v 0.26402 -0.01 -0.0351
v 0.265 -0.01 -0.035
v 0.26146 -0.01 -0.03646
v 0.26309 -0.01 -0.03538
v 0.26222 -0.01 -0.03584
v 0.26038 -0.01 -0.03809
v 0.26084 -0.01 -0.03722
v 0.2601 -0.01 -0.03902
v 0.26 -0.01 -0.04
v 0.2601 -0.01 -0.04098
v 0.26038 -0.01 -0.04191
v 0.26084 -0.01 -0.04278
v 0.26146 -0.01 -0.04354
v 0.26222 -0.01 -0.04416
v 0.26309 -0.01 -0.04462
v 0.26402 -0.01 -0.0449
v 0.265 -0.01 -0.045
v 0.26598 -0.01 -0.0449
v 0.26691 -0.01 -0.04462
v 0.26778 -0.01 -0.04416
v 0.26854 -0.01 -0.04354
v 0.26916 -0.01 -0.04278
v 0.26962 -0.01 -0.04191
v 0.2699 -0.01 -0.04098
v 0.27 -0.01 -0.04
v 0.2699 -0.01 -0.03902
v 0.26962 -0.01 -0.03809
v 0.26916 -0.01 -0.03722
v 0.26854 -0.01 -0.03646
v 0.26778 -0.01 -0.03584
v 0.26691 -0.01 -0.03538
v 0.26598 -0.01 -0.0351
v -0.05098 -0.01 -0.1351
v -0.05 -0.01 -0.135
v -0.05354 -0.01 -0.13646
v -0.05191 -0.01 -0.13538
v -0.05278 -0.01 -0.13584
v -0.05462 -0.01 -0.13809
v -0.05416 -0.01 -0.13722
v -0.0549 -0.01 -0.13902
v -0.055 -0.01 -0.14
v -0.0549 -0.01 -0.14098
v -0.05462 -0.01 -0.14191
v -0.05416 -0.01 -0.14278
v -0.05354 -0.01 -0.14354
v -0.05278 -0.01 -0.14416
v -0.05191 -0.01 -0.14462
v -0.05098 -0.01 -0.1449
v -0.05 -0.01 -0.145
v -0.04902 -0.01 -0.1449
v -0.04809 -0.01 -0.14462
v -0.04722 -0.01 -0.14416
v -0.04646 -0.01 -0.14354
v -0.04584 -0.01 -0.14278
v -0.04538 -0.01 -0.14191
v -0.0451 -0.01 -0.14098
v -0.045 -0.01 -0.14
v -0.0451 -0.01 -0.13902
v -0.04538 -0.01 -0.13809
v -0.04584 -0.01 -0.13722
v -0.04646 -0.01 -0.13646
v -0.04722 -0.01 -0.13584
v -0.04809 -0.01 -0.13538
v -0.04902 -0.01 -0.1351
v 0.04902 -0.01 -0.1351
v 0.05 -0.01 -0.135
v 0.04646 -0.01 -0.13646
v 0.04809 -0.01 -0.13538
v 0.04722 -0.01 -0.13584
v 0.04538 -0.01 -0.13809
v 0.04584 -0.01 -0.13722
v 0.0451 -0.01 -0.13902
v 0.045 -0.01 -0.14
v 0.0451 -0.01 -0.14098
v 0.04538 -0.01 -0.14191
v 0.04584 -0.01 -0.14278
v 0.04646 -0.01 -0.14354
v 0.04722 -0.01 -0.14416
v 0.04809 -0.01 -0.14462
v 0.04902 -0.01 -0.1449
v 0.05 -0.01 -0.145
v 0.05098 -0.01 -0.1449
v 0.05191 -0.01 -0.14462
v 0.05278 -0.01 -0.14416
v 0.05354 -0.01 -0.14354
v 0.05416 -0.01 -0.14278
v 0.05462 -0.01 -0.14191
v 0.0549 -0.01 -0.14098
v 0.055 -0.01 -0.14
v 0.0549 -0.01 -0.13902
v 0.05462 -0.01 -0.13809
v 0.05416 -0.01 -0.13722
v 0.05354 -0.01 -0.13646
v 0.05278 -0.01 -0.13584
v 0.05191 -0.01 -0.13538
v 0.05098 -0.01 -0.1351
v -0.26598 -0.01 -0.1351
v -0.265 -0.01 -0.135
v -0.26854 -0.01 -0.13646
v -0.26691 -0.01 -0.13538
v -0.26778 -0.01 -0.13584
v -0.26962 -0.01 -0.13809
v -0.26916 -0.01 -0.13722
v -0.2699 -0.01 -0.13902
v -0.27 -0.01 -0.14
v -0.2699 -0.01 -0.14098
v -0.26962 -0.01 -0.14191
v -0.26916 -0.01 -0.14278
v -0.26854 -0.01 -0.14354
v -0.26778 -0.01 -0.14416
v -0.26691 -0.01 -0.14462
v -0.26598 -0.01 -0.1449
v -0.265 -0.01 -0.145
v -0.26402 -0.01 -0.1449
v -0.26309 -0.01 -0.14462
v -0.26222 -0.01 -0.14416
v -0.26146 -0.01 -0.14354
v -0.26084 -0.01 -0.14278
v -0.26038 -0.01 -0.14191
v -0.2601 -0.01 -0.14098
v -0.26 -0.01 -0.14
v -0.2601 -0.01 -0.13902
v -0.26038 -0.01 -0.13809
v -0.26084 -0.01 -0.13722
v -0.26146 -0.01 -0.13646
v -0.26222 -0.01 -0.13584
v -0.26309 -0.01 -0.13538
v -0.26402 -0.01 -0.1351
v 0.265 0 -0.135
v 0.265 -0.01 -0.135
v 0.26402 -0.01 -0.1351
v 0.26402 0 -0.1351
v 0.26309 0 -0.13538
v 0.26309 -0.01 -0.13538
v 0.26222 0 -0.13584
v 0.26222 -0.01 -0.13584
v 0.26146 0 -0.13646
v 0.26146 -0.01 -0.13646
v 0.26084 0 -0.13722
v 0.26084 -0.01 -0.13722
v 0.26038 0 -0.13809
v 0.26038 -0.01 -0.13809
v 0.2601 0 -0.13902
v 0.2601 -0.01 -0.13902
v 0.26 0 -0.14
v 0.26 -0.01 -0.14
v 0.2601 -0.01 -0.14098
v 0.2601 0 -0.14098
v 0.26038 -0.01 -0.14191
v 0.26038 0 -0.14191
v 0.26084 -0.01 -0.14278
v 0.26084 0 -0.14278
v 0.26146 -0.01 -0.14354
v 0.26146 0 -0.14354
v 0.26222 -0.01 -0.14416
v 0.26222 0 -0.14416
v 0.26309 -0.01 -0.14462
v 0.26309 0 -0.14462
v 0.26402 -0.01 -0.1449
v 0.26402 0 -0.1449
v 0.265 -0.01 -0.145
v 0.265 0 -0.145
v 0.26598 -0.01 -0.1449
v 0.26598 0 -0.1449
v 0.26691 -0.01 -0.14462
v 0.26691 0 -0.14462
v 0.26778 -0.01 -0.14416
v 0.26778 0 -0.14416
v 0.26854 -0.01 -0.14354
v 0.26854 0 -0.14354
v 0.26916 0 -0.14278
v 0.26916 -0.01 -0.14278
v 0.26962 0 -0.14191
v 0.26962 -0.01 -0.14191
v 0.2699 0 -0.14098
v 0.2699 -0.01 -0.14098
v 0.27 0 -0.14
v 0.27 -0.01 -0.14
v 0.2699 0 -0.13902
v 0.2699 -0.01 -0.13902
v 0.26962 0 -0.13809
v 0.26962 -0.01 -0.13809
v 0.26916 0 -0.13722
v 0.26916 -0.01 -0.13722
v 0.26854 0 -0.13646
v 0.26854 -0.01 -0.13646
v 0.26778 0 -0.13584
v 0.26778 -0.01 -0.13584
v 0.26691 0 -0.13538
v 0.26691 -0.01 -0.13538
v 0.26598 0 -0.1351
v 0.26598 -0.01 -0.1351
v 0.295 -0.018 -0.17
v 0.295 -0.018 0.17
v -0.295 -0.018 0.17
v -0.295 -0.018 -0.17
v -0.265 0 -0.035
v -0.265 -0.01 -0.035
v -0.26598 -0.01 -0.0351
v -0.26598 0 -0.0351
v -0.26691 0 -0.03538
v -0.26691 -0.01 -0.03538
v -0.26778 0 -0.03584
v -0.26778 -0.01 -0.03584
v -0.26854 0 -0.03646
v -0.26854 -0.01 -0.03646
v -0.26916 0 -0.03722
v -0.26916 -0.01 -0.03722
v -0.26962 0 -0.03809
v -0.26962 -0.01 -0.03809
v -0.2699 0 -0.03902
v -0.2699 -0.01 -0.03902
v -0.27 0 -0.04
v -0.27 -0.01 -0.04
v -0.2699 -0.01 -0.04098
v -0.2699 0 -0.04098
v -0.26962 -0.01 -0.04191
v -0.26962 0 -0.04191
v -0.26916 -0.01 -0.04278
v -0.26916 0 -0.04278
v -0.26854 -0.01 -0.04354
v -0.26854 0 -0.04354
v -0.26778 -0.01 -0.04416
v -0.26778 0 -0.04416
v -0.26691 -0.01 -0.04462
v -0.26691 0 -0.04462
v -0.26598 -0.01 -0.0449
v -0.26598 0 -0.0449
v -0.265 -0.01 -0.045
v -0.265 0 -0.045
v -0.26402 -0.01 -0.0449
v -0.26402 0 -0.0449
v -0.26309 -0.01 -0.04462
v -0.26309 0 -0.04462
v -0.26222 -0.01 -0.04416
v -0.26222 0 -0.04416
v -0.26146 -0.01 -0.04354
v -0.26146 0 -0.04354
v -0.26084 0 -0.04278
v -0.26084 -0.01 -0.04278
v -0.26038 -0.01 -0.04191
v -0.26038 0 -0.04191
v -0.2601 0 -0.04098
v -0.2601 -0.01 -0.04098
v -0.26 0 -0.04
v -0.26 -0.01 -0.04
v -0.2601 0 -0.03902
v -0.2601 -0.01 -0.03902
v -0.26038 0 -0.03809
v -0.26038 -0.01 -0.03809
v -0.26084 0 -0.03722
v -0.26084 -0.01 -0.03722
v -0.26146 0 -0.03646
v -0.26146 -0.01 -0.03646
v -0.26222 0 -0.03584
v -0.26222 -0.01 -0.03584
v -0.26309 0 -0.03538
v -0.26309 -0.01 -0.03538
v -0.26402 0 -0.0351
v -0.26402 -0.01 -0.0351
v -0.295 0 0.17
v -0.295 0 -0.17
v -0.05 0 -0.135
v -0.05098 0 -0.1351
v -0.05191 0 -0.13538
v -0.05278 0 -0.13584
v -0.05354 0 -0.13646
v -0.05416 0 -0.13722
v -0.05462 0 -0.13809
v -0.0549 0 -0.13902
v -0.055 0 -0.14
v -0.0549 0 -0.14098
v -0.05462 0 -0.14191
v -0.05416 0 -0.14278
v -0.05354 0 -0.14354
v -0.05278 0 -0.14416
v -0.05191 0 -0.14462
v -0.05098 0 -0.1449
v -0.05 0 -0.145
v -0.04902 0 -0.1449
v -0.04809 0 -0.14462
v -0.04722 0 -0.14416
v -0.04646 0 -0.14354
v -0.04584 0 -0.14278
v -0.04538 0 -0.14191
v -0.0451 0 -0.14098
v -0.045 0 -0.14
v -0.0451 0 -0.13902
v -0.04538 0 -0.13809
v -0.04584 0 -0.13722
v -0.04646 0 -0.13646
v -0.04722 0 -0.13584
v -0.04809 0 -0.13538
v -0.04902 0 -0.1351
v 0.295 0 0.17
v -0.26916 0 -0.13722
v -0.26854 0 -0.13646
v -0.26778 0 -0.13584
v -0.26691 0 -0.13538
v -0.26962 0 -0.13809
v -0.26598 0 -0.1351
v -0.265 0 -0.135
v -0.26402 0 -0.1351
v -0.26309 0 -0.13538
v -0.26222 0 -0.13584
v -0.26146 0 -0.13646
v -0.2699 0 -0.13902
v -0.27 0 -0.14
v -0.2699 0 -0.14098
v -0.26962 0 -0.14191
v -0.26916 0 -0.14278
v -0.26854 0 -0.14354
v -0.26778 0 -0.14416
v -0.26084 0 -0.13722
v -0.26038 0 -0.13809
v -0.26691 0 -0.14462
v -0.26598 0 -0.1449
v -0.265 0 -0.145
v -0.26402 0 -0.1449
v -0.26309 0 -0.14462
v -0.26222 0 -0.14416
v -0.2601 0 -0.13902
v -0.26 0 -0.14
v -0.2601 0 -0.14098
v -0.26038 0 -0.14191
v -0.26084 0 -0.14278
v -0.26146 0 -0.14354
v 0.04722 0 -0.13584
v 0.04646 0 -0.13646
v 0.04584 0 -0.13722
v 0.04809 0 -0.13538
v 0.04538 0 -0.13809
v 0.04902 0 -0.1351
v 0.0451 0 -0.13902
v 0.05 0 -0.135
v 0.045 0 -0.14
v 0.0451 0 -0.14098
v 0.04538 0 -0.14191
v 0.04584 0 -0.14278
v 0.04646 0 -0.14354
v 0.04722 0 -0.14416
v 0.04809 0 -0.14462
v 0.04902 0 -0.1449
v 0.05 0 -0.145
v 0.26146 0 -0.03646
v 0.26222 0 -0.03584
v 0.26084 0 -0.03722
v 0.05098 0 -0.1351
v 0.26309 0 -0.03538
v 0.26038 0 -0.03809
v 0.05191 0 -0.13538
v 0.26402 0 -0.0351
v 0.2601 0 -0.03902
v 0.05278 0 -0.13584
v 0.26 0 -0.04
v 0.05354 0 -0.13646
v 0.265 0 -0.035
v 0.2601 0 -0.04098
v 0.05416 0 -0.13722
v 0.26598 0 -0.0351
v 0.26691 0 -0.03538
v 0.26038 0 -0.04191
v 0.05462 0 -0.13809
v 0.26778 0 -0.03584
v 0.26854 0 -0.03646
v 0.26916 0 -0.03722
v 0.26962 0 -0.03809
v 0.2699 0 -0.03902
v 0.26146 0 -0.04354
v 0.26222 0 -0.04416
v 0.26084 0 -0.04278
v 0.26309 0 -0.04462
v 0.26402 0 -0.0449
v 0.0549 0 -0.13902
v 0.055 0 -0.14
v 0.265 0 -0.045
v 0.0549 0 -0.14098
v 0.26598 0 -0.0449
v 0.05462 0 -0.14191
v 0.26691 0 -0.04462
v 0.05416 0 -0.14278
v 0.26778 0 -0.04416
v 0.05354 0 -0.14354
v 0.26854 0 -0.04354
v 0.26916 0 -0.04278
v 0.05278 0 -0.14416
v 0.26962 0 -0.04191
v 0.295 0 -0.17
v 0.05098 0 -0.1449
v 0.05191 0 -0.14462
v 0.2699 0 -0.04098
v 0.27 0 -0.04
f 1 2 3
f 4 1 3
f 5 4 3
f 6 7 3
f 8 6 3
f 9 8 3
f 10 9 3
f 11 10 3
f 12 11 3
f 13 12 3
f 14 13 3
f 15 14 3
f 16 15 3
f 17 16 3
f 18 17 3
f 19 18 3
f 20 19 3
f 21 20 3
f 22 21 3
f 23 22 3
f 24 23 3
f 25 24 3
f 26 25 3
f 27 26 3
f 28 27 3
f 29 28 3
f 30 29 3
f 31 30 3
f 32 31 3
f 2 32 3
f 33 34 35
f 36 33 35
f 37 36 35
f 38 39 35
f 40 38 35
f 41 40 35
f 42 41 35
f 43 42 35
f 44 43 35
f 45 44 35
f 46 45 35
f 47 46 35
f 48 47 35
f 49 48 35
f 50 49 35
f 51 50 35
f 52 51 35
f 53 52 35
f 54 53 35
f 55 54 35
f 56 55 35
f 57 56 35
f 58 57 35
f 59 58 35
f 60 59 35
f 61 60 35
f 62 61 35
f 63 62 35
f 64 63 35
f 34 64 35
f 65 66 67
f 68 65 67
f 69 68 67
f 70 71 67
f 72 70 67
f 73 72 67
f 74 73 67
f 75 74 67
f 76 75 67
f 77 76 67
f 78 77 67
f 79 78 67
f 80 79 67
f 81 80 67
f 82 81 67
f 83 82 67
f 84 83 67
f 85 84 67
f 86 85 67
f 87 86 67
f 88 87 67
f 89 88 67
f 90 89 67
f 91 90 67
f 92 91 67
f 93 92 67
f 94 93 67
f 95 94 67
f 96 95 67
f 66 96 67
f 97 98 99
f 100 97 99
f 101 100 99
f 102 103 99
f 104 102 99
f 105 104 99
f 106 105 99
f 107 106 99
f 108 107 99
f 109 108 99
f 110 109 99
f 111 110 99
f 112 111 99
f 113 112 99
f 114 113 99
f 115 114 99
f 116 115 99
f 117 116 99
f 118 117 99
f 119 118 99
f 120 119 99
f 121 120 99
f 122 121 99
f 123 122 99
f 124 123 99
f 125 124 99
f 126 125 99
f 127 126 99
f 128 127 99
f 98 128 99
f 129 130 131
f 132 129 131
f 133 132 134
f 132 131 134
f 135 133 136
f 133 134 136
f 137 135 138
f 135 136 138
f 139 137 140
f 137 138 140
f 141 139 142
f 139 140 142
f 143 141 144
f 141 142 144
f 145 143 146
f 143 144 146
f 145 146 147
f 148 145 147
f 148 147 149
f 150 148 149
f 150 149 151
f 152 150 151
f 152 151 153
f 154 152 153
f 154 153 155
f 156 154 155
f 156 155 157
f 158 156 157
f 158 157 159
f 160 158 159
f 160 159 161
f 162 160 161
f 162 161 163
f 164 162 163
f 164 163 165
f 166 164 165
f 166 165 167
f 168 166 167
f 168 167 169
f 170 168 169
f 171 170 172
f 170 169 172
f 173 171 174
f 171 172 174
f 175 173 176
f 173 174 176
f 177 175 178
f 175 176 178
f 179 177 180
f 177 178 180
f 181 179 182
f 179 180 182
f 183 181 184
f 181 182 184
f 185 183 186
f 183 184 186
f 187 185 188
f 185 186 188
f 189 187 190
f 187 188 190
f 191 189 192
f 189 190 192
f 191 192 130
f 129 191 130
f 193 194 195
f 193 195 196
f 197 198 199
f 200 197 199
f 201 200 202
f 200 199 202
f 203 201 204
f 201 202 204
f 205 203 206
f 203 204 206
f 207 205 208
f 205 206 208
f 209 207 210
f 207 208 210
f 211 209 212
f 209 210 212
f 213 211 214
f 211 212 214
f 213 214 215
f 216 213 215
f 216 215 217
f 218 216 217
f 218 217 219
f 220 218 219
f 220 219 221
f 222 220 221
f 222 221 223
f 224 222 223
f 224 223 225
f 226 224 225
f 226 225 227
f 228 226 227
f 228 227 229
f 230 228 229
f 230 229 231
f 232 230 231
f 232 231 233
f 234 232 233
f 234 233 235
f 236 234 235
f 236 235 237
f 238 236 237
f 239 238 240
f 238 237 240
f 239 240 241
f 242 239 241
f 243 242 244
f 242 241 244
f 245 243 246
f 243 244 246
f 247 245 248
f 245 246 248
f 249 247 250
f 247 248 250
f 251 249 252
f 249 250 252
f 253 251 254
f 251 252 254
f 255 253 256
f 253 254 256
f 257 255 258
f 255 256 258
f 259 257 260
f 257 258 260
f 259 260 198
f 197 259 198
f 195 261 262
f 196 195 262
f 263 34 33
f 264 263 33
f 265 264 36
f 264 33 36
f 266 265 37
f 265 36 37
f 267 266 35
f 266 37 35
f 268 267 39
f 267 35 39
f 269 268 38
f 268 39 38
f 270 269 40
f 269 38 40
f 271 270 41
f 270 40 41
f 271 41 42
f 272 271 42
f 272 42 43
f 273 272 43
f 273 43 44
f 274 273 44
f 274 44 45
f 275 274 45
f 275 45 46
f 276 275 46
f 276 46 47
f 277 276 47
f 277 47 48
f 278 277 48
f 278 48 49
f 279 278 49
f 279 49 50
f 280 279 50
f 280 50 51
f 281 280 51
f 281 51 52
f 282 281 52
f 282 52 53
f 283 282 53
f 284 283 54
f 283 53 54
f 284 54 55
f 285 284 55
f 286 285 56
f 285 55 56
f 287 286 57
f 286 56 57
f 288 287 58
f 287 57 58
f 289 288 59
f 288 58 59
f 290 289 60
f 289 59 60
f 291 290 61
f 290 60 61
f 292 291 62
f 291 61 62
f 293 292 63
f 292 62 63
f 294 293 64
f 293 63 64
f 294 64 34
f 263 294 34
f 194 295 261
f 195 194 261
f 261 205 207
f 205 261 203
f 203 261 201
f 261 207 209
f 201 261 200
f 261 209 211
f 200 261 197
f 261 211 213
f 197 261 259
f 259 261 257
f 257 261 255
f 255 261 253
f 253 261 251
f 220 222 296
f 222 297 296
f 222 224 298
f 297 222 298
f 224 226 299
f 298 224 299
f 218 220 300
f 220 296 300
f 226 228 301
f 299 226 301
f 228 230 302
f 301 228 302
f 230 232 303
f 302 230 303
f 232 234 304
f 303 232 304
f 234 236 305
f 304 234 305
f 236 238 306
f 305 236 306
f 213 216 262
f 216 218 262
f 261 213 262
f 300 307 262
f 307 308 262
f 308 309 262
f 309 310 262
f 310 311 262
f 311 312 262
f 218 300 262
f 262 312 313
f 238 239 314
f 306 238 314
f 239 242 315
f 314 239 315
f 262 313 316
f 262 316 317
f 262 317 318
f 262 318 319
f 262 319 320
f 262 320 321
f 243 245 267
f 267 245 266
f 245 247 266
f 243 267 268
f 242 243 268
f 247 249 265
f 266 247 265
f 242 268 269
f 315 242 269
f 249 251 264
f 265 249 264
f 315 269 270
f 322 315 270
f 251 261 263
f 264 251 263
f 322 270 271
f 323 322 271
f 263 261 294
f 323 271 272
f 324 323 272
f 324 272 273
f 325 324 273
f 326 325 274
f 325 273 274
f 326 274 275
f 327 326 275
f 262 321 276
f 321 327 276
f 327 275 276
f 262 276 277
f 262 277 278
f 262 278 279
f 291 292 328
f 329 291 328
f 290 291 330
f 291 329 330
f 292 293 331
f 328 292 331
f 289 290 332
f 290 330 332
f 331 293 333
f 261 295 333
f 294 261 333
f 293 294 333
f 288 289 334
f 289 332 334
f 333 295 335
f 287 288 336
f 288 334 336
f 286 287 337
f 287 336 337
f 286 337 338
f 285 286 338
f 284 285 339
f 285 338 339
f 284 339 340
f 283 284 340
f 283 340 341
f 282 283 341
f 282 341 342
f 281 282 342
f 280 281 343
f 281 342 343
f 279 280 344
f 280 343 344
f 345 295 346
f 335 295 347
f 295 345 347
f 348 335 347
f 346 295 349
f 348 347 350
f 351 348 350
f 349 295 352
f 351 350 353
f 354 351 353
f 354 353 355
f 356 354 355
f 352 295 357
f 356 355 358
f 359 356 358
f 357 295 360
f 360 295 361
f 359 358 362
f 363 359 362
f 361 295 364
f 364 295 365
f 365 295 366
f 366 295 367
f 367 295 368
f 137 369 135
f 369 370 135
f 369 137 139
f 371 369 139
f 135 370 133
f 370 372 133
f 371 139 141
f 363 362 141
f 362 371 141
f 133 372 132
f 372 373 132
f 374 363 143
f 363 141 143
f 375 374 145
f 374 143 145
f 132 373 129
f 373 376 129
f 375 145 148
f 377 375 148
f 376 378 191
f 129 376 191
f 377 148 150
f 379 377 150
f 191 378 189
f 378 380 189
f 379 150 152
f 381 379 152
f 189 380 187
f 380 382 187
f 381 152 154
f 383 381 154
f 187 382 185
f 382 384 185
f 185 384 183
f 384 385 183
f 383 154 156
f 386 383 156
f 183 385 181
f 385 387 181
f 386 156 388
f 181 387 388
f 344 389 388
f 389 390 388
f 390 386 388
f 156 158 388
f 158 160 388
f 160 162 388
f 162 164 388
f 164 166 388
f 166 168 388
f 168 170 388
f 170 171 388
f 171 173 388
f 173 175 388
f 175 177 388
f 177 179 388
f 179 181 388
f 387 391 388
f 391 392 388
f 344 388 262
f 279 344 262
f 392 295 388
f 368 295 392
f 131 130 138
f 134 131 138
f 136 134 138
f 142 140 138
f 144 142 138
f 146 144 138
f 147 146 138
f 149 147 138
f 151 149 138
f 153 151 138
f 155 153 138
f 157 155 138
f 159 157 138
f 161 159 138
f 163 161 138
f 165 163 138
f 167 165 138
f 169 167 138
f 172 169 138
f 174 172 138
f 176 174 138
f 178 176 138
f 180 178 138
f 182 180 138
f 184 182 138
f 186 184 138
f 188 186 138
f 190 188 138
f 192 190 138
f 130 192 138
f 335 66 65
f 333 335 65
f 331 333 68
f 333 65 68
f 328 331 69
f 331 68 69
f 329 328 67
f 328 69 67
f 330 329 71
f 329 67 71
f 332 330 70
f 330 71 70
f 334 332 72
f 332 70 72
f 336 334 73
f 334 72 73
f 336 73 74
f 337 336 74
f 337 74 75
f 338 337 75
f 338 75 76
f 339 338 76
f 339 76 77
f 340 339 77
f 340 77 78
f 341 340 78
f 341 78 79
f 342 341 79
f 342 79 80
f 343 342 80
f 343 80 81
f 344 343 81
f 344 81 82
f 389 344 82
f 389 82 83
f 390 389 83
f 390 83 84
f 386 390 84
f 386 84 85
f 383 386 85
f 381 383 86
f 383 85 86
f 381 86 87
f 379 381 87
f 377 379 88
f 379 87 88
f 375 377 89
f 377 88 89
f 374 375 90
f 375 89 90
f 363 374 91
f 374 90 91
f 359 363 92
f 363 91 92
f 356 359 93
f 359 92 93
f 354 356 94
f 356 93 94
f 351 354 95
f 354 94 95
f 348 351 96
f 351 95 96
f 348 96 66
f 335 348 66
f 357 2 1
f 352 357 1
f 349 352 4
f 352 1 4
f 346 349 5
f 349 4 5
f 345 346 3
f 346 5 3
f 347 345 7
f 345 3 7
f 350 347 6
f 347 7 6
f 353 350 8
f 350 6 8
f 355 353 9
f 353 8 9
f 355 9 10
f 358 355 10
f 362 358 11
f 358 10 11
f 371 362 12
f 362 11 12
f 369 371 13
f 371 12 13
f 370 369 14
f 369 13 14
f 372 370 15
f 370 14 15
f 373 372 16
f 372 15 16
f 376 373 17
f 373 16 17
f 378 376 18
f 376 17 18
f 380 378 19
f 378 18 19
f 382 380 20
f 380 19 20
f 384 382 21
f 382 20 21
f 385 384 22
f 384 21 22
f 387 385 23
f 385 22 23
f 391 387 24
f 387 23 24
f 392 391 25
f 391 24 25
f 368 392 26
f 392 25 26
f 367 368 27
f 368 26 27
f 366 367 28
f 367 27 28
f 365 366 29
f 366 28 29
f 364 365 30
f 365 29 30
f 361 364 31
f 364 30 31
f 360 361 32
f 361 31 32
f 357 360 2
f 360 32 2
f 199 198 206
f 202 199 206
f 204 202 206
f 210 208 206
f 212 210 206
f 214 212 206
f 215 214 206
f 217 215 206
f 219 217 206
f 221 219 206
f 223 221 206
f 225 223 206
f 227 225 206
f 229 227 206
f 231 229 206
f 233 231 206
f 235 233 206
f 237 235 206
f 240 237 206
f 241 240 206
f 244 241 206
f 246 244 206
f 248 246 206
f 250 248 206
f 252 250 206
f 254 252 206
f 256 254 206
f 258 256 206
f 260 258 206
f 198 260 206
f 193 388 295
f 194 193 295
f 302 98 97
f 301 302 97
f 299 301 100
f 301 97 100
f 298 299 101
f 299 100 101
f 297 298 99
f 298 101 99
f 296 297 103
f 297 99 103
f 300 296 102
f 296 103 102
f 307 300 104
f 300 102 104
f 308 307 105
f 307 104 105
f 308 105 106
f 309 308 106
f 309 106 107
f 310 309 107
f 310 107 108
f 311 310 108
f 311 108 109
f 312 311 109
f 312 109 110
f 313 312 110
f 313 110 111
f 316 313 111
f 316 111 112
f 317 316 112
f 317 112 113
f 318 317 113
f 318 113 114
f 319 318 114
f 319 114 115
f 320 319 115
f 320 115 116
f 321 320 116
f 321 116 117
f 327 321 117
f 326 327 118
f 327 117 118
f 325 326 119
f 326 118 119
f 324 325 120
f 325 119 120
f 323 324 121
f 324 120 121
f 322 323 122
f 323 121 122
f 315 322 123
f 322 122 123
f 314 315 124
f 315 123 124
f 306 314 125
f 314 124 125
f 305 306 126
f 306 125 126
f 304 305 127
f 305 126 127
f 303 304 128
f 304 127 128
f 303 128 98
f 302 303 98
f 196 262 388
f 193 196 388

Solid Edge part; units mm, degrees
sketch "Sketch1" plane through (0, 0, 0) normal (0, -1, 0) x (1, 0, 0)
  line L0 (-0.295, -0.17) -> (0.295, -0.17)
  line L1 (0.295, -0.17) -> (0.295, 0.17)
  line L2 (0.295, 0.17) -> (-0.295, 0.17)
  line L3 (-0.295, 0.17) -> (-0.295, -0.17)
  dimension "D1" = 0.34
  dimension "D2" = 0.59
extrude "Protrusion1" add sketch "Sketch1" along normal blind 0.018
hole "Bohrung_1" at (-0.05, 0, -0.14) direction (0, -1, 0) diameter 0.01 depth 0.01
hole "Hole1" at (0.05, 0, -0.14) direction (0, -1, 0) diameter 0.01 depth 0.01
hole "Hole2" at (-0.265, 0, -0.14) direction (0, -1, 0) diameter 0.01 depth 0.01
hole "Hole3" at (-0.265, 0, -0.04) direction (0, -1, 0) diameter 0.01 depth 0.01
hole "Hole4" at (0.265, 0, -0.04) direction (0, -1, 0) diameter 0.01 depth 0.01
hole "Hole5" at (0.265, 0, -0.14) direction (0, -1, 0) diameter 0.01 depth 0.01
